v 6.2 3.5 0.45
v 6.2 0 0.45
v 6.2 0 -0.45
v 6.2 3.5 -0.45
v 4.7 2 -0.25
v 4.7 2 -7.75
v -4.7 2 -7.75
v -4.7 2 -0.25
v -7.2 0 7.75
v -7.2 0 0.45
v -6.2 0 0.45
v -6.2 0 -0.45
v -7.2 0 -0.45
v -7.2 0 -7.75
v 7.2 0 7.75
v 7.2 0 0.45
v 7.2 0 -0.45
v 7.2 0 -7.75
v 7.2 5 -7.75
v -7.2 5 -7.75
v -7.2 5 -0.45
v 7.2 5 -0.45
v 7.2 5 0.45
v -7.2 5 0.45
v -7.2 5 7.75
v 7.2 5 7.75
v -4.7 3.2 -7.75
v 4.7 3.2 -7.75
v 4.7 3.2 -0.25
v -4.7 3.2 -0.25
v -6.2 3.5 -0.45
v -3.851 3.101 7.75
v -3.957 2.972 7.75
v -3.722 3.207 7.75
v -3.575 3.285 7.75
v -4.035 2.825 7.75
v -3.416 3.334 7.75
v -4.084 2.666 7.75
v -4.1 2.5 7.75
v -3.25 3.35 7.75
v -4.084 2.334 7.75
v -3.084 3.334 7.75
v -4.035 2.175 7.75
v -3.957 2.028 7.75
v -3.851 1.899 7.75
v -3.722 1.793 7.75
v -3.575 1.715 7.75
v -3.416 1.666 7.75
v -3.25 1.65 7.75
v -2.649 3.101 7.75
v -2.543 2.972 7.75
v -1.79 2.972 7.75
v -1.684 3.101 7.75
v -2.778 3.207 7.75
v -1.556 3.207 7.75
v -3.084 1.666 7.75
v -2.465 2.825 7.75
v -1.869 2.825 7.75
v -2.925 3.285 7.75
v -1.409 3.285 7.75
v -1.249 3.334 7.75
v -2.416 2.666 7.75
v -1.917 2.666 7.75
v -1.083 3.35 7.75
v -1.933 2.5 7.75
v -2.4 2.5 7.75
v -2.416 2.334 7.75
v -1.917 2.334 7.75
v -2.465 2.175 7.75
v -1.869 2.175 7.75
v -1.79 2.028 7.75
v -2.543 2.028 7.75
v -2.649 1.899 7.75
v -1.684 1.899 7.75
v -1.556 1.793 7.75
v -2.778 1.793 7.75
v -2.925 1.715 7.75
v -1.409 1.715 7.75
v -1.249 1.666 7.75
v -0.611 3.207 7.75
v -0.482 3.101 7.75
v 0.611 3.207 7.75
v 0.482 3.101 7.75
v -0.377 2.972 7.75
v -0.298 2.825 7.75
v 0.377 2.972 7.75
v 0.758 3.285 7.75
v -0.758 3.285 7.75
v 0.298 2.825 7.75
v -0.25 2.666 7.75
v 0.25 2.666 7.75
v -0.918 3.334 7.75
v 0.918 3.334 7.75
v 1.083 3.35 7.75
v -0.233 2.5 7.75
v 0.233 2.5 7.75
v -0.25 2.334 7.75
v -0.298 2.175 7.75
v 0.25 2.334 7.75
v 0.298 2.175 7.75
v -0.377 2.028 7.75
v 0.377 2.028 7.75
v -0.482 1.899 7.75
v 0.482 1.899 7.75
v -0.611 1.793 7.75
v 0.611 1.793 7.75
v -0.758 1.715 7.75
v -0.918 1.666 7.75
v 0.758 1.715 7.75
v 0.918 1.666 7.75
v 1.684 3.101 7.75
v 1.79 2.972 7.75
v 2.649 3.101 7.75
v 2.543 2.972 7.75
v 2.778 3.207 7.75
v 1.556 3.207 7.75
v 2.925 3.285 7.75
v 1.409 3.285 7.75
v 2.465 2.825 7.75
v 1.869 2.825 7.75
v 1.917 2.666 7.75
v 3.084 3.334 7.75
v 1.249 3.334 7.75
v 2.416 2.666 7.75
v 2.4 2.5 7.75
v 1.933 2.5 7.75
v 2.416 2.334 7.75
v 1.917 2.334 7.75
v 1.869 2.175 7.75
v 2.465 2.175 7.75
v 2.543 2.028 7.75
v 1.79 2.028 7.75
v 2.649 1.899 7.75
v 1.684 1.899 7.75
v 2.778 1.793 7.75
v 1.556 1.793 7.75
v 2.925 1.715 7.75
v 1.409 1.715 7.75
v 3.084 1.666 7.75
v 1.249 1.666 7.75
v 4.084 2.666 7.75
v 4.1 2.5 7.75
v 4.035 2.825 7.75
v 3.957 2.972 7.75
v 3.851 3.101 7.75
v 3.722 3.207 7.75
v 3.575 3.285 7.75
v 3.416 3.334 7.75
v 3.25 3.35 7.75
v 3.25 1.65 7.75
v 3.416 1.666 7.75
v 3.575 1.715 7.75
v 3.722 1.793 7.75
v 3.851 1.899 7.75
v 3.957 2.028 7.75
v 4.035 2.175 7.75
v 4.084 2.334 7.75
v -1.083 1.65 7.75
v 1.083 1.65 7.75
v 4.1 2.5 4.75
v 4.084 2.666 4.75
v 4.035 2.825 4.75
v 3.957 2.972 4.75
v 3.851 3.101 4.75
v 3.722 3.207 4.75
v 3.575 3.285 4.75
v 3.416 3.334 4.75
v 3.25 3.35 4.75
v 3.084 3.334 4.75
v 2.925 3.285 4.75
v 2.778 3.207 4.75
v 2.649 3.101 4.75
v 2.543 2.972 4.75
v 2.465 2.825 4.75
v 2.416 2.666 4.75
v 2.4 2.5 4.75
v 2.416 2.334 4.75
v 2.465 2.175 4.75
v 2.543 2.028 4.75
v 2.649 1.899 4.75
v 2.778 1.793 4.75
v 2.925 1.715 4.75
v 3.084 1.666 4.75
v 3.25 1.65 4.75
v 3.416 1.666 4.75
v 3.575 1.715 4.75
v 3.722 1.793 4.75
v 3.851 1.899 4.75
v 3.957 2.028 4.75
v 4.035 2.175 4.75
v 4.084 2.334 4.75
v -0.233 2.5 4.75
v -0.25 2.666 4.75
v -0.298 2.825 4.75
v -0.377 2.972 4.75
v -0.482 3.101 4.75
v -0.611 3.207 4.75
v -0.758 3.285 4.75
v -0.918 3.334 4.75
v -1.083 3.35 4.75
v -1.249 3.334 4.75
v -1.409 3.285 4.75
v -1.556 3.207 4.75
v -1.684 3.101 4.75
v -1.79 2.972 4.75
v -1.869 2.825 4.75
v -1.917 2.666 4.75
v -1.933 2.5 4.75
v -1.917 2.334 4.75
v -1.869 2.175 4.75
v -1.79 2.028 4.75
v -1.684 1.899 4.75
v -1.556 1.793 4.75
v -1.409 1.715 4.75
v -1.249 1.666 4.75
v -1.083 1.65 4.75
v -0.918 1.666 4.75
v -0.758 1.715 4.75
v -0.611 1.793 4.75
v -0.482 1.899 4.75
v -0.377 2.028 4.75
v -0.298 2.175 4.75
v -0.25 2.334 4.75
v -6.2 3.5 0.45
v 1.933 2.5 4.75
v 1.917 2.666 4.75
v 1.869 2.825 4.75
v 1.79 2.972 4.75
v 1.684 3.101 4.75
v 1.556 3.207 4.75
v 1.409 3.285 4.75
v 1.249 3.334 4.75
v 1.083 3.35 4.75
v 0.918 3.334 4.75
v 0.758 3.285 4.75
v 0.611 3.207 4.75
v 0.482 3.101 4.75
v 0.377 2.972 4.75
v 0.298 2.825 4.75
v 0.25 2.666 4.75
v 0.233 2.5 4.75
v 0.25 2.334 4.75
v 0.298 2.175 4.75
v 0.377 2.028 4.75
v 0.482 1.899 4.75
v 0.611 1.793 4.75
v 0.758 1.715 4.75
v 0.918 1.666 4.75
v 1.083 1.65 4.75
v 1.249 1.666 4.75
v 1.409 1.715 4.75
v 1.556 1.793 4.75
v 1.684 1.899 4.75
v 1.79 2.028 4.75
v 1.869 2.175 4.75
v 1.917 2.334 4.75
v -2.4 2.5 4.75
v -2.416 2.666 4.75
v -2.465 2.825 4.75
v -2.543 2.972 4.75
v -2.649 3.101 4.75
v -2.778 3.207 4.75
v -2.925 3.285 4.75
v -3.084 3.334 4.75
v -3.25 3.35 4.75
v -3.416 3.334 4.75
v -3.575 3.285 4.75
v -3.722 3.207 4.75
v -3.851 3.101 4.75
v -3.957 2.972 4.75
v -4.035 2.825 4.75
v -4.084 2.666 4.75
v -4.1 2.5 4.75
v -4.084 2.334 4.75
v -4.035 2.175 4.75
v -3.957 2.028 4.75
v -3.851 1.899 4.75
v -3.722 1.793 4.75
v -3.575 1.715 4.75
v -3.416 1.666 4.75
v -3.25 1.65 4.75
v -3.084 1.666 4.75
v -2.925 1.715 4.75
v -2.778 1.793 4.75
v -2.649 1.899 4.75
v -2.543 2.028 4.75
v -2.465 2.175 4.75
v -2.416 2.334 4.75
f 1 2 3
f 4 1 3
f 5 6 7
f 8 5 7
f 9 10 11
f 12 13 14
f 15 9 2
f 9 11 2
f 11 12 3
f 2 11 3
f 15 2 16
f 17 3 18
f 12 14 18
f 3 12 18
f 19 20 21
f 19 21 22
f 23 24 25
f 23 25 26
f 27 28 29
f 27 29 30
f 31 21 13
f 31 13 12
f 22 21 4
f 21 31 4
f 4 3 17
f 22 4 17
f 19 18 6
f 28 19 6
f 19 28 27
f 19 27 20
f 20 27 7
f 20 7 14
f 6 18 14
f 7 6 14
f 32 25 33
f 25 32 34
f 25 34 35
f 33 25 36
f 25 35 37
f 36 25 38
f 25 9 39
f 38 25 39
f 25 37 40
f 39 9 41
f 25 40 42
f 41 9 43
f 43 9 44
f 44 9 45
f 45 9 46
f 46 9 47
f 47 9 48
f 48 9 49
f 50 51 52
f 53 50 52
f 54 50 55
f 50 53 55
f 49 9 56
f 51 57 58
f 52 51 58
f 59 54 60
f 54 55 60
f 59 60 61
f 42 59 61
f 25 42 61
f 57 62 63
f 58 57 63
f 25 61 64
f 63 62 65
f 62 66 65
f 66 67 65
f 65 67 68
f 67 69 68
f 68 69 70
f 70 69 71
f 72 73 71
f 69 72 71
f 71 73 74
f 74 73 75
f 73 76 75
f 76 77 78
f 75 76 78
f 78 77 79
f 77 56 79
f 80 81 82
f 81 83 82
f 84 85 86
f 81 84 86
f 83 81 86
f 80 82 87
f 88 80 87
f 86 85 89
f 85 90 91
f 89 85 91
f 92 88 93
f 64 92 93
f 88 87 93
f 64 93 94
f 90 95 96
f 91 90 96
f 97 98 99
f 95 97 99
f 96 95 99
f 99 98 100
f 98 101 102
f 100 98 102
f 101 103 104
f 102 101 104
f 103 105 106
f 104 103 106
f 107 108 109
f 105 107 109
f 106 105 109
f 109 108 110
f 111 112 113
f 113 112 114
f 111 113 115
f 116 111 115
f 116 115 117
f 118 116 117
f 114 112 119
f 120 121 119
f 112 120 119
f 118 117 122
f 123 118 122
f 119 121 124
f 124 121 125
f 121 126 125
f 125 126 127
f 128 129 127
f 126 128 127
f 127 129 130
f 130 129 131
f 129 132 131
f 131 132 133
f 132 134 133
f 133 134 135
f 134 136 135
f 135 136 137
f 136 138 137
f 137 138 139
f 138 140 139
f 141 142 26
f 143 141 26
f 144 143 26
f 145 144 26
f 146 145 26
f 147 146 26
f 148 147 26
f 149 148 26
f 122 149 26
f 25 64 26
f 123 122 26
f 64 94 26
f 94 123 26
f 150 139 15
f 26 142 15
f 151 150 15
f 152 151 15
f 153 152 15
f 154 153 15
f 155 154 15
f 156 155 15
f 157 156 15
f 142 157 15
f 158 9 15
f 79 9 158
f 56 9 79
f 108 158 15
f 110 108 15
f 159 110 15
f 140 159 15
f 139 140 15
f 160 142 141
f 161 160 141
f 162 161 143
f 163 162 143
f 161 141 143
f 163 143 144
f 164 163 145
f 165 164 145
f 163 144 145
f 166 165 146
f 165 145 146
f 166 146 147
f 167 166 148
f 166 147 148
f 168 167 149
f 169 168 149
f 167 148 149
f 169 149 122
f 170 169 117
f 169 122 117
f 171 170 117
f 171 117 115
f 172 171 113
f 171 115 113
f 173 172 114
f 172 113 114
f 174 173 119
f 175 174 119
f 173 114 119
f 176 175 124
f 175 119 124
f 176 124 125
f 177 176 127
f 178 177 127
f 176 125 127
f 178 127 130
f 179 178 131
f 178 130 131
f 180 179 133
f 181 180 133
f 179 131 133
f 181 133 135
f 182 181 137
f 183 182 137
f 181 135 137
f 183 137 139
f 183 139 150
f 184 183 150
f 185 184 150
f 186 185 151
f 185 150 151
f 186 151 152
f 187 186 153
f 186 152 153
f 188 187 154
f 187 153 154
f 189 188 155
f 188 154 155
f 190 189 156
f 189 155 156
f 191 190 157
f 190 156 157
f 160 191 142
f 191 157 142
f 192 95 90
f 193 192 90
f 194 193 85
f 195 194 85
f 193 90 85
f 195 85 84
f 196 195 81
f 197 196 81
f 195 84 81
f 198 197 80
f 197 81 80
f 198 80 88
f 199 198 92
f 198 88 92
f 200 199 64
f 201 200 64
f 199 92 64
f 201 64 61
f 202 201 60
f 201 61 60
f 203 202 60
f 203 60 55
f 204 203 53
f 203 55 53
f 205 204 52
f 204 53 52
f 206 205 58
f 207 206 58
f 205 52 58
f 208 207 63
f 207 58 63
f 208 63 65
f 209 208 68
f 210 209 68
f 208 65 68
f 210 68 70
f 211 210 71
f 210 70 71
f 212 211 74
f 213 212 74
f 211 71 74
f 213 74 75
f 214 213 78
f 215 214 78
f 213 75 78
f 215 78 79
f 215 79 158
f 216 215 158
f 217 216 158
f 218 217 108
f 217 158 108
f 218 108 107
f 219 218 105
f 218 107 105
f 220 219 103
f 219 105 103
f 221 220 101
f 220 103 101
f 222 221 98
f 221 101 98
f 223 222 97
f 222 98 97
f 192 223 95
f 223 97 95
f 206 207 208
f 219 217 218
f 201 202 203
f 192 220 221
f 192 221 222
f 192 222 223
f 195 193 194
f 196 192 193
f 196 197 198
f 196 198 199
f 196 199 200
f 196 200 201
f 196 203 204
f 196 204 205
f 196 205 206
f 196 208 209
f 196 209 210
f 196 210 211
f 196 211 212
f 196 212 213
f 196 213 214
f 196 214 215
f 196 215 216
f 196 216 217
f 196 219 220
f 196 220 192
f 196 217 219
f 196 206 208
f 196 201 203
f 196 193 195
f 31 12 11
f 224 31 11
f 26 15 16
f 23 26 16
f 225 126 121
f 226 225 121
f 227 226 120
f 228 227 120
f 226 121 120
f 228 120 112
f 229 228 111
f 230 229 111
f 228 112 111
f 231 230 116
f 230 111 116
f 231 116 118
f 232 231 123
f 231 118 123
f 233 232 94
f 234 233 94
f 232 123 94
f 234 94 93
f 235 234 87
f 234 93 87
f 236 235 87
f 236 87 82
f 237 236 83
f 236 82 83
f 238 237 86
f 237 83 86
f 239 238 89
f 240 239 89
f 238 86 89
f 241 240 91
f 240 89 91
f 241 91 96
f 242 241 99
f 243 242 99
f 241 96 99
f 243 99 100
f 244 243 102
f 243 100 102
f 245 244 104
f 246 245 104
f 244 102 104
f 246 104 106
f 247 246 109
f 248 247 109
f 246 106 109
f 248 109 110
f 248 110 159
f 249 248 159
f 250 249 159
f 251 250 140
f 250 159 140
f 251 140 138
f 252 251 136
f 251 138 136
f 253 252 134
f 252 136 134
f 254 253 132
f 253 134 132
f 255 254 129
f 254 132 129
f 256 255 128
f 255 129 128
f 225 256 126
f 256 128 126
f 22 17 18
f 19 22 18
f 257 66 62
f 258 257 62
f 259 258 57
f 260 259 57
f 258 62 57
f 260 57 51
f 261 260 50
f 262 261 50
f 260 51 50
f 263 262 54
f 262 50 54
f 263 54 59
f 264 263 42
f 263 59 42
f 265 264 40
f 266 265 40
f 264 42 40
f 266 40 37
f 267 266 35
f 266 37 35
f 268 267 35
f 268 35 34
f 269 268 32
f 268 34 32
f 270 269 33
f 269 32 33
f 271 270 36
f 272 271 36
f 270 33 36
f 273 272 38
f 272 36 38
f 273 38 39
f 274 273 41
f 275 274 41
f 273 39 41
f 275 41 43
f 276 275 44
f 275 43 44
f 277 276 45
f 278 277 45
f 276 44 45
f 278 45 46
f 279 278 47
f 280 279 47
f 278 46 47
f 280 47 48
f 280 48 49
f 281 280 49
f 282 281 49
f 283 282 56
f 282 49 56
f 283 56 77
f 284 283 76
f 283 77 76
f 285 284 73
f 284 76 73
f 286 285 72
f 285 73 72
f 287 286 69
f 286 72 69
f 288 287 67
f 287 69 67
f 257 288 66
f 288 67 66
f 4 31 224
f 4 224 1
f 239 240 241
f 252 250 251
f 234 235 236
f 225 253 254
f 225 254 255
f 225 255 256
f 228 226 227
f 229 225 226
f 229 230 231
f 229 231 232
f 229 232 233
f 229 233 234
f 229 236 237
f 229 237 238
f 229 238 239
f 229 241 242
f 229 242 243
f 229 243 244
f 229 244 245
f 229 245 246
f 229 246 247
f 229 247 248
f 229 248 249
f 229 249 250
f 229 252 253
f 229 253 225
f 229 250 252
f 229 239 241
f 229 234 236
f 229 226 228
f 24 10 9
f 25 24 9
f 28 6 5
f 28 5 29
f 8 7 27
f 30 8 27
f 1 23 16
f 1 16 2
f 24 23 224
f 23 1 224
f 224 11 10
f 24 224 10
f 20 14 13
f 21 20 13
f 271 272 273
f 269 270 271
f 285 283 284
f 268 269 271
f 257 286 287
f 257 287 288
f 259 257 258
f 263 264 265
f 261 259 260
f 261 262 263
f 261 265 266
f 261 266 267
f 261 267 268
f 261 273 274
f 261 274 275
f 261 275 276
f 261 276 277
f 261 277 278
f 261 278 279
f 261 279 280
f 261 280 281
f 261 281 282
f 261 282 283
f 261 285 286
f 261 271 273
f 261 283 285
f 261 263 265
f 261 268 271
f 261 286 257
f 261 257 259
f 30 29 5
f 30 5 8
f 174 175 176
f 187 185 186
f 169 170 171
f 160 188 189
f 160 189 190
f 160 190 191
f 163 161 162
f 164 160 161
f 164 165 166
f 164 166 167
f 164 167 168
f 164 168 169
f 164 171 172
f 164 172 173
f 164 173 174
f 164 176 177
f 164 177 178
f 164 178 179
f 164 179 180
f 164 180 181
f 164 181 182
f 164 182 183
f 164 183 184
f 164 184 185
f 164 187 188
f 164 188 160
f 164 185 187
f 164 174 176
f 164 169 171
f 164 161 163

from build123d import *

# Parameters (mm, degrees)
BOSS_EXTRUDE1_DEPTH   = 5
SKETCH2_W             = 12.4
SKETCH2_H             = 0.9
CUT_EXTRUDE1_DEPTH    = 1.5
CROQUIS1_R            = 0.85
CORTAR_EXTRUIR1_DEPTH = 3
CROQUIS2_W            = 9.4
CROQUIS2_H            = 1.2
CORTAR_EXTRUIR2_DEPTH = 7.5


with BuildPart() as part:
    # Sketch1 → Boss-Extrude1 (new body)
    with BuildSketch(Plane(origin=(0, 0, 0), x_dir=(1, 0, 0), z_dir=(0, 1, 0))):
        Polygon((-7.2, -7.75), (7.2, -7.75), (7.2, -0.45), (6.2, -0.45), (6.2, 0.45), (7.2, 0.45), (7.2, 7.75), (-7.2, 7.75), (-7.2, 0.45), (-6.2, 0.45), (-6.2, -0.45), (-7.2, -0.45), align=None)
    extrude(amount=BOSS_EXTRUDE1_DEPTH)

    # Sketch2 → Cut-Extrude1 (cut)
    with BuildSketch(Plane(origin=(0, 5, 0), x_dir=(1, 0, 0), z_dir=(0, 1, 0))):
        Rectangle(SKETCH2_W, SKETCH2_H)
    extrude(amount=-CUT_EXTRUDE1_DEPTH, mode=Mode.SUBTRACT)

    # Croquis1 → Cortar-Extruir1 (cut)
    with BuildSketch(Plane.XY.offset(7.75)):
        with Locations((-3.25, 2.5)):
            Circle(CROQUIS1_R)
        with Locations((-1.083333333, 2.5)):
            Circle(CROQUIS1_R)
        with Locations((1.083333333, 2.5)):
            Circle(CROQUIS1_R)
        with Locations((3.25, 2.5)):
            Circle(CROQUIS1_R)
    extrude(amount=-CORTAR_EXTRUIR1_DEPTH, mode=Mode.SUBTRACT)

    # Croquis2 → Cortar-Extruir2 (cut)
    with BuildSketch(Plane(origin=(0, 0, -7.75), x_dir=(-1, 0, 0), z_dir=(0, 0, -1))):
        with Locations((0, 2.6)):
            Rectangle(CROQUIS2_W, CROQUIS2_H)
    extrude(amount=-CORTAR_EXTRUIR2_DEPTH, mode=Mode.SUBTRACT)


solid = part.part
